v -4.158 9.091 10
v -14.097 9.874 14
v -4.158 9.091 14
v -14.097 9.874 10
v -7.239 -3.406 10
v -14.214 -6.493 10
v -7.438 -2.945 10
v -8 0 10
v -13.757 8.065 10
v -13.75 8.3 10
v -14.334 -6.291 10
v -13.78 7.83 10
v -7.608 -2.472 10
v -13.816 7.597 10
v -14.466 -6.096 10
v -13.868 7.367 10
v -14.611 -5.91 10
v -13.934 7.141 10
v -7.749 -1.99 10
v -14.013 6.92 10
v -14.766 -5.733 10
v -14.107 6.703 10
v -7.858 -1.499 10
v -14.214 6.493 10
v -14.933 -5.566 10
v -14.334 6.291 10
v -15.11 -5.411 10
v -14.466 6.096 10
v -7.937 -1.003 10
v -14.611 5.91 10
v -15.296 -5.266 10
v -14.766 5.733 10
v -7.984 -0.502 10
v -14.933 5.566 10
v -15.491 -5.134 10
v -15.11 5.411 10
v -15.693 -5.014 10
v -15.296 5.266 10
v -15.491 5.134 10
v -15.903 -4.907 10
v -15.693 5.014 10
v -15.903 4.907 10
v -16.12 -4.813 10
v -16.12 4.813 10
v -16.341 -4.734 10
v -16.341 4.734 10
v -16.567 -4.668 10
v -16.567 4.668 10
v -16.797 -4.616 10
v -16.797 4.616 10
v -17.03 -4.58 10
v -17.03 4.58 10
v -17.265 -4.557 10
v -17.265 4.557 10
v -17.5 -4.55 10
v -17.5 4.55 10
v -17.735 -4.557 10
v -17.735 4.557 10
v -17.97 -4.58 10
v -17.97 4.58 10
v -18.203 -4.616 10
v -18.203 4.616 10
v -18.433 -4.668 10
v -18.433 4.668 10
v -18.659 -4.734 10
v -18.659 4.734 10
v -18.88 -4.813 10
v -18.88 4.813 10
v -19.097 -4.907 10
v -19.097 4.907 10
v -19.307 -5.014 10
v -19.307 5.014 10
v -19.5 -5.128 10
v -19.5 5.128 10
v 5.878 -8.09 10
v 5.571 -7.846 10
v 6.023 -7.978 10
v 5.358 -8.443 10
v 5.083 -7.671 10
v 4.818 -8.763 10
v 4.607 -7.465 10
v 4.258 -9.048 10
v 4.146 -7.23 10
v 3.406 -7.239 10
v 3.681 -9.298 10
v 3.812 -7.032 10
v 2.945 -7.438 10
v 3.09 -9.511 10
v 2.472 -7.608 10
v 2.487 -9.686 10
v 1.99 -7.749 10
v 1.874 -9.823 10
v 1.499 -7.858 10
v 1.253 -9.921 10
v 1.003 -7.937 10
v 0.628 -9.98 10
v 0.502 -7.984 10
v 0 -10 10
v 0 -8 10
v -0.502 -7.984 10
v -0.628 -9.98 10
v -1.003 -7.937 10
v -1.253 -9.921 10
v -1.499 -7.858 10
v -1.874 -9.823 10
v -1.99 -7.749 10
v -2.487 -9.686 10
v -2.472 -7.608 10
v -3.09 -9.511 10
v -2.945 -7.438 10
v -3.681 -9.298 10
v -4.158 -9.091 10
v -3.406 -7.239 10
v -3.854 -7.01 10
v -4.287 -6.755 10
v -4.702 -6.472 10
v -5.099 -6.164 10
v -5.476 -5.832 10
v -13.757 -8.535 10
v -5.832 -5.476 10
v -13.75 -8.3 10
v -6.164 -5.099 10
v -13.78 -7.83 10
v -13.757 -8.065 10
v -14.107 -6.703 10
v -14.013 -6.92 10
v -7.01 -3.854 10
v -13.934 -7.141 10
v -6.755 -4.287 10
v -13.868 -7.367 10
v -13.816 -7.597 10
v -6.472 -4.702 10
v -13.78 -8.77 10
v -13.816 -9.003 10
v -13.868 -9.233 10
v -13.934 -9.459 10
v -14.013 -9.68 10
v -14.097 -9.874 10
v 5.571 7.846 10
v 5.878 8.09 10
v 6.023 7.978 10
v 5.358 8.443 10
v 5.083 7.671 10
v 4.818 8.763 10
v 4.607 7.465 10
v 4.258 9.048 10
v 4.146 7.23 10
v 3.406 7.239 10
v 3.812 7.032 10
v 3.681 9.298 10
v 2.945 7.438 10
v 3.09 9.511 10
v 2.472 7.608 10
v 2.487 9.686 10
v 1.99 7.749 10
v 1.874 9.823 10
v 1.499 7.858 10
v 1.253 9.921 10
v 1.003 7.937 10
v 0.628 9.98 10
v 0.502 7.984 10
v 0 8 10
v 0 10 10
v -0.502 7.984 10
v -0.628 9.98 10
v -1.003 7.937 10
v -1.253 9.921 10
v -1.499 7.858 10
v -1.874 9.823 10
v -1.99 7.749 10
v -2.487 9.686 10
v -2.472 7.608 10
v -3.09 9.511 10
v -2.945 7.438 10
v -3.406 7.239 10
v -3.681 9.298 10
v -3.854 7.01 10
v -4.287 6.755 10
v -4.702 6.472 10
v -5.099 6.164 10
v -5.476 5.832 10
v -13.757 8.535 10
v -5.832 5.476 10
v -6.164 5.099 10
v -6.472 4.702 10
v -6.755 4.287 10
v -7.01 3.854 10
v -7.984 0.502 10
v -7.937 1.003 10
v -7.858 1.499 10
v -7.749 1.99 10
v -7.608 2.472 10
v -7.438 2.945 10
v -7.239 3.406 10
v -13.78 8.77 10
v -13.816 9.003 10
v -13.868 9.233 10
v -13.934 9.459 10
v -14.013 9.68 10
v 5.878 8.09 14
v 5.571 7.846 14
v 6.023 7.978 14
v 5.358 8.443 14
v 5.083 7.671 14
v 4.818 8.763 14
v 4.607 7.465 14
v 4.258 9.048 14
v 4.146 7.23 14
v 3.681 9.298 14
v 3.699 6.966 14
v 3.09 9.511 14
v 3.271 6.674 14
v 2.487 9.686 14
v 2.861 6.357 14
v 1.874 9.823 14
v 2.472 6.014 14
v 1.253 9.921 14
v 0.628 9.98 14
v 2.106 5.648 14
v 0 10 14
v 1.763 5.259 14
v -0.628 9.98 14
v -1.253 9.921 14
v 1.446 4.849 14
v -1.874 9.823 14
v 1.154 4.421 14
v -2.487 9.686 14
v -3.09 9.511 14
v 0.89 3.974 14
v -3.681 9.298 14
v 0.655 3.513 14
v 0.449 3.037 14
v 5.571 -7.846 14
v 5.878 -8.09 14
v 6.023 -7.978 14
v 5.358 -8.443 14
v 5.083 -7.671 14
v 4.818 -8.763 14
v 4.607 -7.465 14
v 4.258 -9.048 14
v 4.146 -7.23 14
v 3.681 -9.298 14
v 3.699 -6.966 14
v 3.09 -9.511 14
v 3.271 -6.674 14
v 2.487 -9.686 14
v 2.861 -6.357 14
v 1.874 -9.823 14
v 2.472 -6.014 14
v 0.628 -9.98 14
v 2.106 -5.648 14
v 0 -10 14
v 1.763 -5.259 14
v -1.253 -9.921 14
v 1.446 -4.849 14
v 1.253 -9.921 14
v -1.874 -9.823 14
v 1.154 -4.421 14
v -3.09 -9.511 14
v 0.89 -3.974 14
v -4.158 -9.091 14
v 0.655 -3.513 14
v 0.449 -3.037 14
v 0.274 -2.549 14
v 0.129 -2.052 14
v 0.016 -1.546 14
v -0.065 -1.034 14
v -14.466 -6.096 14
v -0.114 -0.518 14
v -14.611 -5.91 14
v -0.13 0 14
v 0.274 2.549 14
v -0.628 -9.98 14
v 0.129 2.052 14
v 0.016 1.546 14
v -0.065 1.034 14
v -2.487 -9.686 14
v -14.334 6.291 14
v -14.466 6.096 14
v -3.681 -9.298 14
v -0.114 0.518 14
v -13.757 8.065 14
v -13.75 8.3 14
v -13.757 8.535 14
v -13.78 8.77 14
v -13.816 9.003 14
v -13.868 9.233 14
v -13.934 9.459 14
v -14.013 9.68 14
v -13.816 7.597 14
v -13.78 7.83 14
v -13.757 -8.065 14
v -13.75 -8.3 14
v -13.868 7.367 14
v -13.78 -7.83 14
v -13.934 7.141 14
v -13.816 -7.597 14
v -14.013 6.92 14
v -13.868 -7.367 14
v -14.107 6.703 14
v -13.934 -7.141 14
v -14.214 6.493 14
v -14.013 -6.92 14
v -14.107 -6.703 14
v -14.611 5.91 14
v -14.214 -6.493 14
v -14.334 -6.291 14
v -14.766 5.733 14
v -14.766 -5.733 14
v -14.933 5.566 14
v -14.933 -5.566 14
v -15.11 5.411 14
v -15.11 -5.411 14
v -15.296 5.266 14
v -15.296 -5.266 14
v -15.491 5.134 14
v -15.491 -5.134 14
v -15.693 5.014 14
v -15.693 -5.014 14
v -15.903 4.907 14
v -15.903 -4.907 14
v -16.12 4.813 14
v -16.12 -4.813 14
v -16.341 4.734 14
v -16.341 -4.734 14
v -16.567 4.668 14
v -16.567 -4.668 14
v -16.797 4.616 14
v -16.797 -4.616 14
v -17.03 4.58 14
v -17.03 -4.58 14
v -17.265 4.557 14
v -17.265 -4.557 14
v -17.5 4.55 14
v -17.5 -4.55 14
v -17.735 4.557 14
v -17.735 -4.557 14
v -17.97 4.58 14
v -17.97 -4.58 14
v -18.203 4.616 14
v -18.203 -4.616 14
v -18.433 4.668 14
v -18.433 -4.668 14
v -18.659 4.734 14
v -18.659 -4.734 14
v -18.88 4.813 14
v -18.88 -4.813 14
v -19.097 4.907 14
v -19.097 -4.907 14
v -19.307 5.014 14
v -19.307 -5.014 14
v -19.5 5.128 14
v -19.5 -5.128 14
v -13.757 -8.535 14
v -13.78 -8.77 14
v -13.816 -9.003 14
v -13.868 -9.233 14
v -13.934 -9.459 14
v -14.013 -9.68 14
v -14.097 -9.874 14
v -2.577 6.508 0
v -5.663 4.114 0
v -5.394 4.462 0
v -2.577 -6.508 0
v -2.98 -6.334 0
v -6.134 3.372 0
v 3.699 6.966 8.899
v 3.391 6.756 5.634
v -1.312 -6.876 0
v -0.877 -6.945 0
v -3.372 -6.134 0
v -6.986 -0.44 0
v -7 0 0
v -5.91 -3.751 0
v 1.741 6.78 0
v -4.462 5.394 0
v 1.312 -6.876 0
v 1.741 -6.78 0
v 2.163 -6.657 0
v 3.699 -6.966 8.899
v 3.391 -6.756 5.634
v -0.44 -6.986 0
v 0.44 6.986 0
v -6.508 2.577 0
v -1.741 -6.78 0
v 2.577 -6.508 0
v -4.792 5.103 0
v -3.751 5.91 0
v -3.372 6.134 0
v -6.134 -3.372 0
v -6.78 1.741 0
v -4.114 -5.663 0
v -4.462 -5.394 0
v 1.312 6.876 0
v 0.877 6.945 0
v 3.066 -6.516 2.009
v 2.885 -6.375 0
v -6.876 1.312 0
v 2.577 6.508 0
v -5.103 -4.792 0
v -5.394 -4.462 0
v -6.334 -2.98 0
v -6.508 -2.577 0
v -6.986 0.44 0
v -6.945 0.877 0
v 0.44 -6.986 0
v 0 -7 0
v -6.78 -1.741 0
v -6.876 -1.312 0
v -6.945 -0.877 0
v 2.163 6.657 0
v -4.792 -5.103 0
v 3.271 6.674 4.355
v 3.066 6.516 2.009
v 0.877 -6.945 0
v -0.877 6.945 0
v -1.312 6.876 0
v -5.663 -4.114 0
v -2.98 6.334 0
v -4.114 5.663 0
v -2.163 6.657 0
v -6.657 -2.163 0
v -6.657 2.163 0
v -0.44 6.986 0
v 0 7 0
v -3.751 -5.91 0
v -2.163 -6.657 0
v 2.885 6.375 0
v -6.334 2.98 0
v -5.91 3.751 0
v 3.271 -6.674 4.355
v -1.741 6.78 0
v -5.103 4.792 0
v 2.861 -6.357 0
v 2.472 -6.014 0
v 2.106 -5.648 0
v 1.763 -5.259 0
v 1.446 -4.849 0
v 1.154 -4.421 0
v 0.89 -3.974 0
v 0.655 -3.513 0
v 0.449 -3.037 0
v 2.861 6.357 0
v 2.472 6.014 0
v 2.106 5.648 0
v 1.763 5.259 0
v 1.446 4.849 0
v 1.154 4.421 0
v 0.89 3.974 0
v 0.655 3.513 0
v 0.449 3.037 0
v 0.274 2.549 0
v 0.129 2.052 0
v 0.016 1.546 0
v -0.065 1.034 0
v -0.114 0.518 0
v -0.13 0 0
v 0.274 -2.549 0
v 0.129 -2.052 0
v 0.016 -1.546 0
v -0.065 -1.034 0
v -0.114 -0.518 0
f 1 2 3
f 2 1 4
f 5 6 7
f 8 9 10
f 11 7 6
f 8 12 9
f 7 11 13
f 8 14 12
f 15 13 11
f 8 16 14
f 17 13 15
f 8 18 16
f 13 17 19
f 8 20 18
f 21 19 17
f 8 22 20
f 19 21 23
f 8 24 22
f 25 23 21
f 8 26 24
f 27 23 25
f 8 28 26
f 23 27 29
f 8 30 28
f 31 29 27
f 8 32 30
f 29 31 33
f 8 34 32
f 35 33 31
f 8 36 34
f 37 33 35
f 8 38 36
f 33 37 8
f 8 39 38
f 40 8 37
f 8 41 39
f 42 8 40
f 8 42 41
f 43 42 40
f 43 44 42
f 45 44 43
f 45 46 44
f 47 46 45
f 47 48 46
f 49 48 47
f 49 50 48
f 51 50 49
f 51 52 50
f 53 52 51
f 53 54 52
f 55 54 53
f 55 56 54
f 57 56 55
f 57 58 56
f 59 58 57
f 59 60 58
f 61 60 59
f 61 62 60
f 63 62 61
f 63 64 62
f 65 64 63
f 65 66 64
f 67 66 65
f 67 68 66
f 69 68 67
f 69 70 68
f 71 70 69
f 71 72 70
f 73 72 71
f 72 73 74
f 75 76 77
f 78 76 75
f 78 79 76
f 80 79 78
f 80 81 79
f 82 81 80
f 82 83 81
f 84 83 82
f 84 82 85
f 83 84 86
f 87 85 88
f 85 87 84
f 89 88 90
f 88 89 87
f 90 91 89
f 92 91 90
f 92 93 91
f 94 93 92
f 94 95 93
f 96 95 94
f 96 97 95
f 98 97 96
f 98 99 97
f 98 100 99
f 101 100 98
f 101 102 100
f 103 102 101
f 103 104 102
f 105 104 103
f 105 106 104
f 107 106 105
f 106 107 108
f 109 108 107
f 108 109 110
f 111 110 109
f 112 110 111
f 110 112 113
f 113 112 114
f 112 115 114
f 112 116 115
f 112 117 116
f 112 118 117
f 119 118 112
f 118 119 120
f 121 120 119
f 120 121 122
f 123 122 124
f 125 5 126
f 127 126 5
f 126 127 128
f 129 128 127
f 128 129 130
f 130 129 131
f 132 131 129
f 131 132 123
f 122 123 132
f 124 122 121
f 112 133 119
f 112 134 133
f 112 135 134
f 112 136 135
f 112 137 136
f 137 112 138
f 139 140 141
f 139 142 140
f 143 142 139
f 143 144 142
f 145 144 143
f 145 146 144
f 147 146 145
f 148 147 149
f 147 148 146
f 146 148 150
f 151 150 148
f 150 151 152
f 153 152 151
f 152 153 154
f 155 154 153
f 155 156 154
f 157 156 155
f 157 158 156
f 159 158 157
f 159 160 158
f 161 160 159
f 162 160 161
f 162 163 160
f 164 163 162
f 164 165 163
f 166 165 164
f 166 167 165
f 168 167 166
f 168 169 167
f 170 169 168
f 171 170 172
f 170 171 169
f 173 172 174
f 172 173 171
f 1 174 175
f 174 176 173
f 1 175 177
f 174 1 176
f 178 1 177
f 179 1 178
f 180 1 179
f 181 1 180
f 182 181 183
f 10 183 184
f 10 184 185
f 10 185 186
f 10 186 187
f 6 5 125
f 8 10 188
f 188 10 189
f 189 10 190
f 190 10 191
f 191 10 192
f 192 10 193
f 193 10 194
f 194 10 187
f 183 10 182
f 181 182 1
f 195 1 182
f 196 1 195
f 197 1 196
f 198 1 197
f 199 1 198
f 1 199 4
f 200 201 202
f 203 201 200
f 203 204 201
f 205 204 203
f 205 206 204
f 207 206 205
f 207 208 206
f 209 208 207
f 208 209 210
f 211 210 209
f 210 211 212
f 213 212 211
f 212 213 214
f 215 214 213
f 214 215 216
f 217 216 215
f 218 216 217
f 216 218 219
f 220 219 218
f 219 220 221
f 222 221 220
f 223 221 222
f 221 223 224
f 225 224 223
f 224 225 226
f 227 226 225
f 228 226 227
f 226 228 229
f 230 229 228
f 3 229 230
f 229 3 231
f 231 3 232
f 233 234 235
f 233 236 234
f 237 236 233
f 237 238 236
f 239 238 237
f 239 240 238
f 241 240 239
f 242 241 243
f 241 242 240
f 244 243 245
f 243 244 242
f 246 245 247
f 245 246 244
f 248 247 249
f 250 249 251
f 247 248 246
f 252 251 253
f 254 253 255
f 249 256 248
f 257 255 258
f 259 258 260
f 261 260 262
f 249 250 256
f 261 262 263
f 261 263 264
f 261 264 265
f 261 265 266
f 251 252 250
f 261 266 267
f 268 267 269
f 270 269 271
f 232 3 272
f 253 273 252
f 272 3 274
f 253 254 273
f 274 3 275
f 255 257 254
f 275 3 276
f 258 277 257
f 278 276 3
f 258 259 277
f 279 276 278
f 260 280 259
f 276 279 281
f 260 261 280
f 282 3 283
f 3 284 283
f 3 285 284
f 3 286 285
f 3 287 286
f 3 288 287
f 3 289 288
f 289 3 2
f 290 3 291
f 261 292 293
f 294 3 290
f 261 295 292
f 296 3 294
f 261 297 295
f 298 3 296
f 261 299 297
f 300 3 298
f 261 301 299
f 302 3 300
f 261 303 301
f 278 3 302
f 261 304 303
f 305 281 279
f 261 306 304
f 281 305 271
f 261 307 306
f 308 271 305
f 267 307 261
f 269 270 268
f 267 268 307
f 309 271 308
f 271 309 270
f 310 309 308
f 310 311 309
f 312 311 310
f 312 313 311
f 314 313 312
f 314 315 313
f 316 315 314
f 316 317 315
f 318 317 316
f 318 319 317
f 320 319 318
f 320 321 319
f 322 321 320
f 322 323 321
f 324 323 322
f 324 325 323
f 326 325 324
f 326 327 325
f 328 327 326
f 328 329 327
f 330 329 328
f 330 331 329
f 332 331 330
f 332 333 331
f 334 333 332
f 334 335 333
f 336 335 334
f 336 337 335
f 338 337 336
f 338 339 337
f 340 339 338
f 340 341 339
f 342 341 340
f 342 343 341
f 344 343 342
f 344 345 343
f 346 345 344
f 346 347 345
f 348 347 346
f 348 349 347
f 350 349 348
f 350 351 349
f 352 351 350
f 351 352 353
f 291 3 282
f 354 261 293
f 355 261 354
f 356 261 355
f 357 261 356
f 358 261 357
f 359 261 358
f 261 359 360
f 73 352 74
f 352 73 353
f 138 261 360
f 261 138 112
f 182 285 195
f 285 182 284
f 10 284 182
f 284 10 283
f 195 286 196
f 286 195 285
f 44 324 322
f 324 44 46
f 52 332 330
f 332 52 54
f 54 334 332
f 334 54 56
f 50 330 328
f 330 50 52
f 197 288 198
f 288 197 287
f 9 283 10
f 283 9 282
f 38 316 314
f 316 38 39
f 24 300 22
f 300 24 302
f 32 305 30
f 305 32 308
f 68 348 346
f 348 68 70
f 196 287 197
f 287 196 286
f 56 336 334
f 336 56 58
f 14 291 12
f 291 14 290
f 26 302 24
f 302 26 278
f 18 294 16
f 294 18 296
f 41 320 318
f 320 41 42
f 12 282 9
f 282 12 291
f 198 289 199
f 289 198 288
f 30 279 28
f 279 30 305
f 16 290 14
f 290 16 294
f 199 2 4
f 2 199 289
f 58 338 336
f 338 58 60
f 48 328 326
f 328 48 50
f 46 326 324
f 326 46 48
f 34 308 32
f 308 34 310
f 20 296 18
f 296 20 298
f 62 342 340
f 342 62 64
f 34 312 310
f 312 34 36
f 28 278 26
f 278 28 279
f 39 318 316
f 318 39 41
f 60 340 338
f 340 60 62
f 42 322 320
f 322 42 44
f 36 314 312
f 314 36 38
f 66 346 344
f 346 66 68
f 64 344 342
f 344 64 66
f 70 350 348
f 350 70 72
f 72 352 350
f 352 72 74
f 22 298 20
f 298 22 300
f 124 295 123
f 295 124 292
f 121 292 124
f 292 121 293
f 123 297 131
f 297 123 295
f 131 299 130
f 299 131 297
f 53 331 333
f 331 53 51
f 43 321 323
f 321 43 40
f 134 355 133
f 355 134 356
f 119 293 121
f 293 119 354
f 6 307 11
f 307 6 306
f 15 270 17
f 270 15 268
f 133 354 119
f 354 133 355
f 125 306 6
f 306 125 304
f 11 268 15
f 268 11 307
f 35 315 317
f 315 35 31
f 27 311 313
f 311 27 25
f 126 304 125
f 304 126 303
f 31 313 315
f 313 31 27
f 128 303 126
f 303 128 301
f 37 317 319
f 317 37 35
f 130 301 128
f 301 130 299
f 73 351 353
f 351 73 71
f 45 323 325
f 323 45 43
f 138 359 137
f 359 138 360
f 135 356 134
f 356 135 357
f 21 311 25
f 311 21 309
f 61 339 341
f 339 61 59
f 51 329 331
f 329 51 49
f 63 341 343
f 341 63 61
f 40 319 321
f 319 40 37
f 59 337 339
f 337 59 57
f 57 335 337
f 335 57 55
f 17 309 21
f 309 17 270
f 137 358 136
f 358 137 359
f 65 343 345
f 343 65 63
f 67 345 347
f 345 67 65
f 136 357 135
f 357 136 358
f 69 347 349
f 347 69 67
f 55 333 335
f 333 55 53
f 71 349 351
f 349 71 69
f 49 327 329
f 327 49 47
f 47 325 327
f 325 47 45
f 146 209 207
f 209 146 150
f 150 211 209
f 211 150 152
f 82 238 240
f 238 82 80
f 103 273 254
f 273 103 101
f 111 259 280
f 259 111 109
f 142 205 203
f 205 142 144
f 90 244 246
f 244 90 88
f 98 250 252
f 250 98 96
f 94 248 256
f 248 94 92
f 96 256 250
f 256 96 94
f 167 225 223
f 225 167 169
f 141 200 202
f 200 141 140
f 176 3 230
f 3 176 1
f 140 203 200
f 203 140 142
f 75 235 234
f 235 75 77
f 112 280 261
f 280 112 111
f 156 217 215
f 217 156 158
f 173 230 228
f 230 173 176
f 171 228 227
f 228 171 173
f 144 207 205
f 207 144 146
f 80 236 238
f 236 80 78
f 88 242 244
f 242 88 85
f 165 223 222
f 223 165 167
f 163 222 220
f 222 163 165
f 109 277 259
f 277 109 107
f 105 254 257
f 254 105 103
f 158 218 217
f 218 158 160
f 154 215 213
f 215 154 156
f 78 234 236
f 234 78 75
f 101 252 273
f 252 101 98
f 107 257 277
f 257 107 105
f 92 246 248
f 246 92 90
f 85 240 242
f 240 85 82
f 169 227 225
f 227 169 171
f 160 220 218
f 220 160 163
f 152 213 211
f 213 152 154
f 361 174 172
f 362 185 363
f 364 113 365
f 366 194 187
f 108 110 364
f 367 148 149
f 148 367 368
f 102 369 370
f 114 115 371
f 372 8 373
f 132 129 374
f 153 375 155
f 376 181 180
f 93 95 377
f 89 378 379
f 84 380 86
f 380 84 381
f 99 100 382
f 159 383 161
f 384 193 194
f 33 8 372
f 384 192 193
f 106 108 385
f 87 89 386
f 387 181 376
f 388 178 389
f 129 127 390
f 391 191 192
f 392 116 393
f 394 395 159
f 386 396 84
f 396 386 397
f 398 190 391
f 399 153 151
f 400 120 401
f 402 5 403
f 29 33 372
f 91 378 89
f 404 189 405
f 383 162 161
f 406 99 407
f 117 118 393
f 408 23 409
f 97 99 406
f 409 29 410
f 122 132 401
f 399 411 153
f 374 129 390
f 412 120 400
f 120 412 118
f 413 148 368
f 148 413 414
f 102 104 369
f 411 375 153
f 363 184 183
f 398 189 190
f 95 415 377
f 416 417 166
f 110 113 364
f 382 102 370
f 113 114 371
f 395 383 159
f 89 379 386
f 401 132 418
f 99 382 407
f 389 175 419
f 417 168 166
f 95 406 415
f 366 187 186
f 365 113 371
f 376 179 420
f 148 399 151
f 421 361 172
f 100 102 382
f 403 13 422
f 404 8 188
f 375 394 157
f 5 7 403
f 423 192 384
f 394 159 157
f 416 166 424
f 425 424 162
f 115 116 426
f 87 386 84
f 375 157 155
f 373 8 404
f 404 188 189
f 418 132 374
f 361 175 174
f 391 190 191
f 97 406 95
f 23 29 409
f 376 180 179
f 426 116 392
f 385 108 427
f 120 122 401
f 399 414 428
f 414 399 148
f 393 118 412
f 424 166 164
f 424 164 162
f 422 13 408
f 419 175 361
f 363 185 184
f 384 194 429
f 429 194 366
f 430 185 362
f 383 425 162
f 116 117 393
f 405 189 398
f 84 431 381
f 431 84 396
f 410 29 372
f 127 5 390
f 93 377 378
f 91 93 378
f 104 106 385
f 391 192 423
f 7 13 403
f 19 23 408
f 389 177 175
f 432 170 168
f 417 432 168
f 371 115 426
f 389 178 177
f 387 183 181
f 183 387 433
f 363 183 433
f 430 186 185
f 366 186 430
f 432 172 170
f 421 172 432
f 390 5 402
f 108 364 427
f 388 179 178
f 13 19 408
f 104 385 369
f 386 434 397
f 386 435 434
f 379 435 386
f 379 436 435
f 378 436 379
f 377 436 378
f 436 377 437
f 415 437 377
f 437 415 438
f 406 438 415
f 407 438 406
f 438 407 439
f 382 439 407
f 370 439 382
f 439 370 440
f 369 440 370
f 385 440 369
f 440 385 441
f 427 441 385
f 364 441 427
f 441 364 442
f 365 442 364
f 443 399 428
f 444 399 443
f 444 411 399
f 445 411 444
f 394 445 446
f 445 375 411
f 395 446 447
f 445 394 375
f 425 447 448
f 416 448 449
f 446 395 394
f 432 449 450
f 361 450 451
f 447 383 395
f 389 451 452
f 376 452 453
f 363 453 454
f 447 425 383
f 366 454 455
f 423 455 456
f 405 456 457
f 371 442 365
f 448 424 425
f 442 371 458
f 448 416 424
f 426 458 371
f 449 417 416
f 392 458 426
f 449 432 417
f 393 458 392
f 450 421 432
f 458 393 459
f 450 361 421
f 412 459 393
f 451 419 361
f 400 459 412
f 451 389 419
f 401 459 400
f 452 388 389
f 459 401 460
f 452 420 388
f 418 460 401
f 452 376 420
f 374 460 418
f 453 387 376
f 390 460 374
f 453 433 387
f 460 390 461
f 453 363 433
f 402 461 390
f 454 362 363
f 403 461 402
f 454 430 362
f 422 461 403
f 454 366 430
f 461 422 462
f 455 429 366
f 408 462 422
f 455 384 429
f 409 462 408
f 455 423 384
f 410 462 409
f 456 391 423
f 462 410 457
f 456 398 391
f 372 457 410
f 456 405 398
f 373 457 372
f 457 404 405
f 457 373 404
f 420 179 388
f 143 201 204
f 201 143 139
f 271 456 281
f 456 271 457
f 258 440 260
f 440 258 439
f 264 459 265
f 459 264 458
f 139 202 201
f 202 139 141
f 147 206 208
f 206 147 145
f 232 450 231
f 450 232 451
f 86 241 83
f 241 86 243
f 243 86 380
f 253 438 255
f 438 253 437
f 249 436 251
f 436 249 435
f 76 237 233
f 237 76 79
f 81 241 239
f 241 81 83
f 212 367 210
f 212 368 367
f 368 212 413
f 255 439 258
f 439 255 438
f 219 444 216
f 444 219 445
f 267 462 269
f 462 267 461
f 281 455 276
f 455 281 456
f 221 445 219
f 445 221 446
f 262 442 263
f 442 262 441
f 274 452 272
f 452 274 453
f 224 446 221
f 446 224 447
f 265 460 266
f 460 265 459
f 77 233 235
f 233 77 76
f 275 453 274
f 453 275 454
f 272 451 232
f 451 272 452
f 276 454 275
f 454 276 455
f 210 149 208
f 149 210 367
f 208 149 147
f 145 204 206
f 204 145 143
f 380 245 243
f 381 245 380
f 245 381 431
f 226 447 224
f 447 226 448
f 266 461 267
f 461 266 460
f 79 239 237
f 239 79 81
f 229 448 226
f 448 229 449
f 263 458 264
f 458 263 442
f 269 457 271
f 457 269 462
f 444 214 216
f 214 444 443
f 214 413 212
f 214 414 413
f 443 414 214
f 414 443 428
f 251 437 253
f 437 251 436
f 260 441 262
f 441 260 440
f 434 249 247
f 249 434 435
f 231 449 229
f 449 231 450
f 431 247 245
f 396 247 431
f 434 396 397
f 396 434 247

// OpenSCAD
//This piece is for the Deltaprintr; It should prevent the Hotend from moving out of the platform

/* [Parameters] */
//This is the Hotend upper diameter usually around 16mm. It'll add 0.5mm to that value to make assembly easier
Diameter_Hotend = 16;   
//Big upper ø should be around 20mm
Big_Diameter = 20;     
//Little Diameter
little_Diameter = 16;   
//the lower little ø is the upper little ø - cone
Cone = 1;               
//The Height of the upper ø
Upper_Height = 4;       
//The Height of the lower ø
Lower_Height = 10;      

/* [Hole for wires?] */
//With hole for wires?
hole = "off"; //[on:with Hole,off:without Hole]
//Holediameter
holedia = 10; //[1:1:10]    

/* [Traxxas] */

//Traxxas On-Off 
Tra = "on"; //[on:with Traxxas,off:without Traxxas]

//Distance between centre and traxas-joint outer
xdis=17.5;
ydis=8.3;

//Diameter of Traxxas-Joint-mount
traxdia=7.5;


///////////////
///Render//////
///////////////

//Renderquality
$fn= 100;       
difference(){
whole();
minus();
}

//Modules
/* [Hidden] */
d1= Diameter_Hotend+0.5;
h1= Lower_Height;
d2= little_Diameter;
d3 = Big_Diameter;
h2= Upper_Height;
cone = Cone;
module whole(){

    if (Tra == "on"){
    withtra();
    }else{
    withouttra();}
    
}

module top(){
translate([0,0,h1])
    cylinder(h2,d3/2,d3/2);
}

module shaft (){
    cylinder (h1,d2/2-cone,d2/2); 
} 

module minus(){
    translate ([8.12,0,-1]) 
        cylinder (h1+h2+2,d1/2,d1/2);
    if (hole == "on"){
    withhole();
    }else{
   }
}

module withhole(){
    translate ([0,0,-1]) 
    cylinder(h1+h2+2,holedia/2,holedia/2);
}

module traxas(){


difference(){
translate([0,0,h1])
linear_extrude(height =h2)
polygon(points=[[-3,d3/2-1],[-xdis-2,ydis+2],[-xdis-2,-ydis-2],[-3,-d3/2+1]]);

translate([-xdis,ydis,h1-1])
    cylinder(h2+2,traxdia/2,traxdia/2);
translate([-xdis,-ydis,h1-1])
    cylinder(h2+2,traxdia/2,traxdia/2);
}
}

module withtra(){
    
    union(){
    top();
    shaft();
    traxas();
}}

module withouttra(){
    union(){
    top();
    shaft();}}
